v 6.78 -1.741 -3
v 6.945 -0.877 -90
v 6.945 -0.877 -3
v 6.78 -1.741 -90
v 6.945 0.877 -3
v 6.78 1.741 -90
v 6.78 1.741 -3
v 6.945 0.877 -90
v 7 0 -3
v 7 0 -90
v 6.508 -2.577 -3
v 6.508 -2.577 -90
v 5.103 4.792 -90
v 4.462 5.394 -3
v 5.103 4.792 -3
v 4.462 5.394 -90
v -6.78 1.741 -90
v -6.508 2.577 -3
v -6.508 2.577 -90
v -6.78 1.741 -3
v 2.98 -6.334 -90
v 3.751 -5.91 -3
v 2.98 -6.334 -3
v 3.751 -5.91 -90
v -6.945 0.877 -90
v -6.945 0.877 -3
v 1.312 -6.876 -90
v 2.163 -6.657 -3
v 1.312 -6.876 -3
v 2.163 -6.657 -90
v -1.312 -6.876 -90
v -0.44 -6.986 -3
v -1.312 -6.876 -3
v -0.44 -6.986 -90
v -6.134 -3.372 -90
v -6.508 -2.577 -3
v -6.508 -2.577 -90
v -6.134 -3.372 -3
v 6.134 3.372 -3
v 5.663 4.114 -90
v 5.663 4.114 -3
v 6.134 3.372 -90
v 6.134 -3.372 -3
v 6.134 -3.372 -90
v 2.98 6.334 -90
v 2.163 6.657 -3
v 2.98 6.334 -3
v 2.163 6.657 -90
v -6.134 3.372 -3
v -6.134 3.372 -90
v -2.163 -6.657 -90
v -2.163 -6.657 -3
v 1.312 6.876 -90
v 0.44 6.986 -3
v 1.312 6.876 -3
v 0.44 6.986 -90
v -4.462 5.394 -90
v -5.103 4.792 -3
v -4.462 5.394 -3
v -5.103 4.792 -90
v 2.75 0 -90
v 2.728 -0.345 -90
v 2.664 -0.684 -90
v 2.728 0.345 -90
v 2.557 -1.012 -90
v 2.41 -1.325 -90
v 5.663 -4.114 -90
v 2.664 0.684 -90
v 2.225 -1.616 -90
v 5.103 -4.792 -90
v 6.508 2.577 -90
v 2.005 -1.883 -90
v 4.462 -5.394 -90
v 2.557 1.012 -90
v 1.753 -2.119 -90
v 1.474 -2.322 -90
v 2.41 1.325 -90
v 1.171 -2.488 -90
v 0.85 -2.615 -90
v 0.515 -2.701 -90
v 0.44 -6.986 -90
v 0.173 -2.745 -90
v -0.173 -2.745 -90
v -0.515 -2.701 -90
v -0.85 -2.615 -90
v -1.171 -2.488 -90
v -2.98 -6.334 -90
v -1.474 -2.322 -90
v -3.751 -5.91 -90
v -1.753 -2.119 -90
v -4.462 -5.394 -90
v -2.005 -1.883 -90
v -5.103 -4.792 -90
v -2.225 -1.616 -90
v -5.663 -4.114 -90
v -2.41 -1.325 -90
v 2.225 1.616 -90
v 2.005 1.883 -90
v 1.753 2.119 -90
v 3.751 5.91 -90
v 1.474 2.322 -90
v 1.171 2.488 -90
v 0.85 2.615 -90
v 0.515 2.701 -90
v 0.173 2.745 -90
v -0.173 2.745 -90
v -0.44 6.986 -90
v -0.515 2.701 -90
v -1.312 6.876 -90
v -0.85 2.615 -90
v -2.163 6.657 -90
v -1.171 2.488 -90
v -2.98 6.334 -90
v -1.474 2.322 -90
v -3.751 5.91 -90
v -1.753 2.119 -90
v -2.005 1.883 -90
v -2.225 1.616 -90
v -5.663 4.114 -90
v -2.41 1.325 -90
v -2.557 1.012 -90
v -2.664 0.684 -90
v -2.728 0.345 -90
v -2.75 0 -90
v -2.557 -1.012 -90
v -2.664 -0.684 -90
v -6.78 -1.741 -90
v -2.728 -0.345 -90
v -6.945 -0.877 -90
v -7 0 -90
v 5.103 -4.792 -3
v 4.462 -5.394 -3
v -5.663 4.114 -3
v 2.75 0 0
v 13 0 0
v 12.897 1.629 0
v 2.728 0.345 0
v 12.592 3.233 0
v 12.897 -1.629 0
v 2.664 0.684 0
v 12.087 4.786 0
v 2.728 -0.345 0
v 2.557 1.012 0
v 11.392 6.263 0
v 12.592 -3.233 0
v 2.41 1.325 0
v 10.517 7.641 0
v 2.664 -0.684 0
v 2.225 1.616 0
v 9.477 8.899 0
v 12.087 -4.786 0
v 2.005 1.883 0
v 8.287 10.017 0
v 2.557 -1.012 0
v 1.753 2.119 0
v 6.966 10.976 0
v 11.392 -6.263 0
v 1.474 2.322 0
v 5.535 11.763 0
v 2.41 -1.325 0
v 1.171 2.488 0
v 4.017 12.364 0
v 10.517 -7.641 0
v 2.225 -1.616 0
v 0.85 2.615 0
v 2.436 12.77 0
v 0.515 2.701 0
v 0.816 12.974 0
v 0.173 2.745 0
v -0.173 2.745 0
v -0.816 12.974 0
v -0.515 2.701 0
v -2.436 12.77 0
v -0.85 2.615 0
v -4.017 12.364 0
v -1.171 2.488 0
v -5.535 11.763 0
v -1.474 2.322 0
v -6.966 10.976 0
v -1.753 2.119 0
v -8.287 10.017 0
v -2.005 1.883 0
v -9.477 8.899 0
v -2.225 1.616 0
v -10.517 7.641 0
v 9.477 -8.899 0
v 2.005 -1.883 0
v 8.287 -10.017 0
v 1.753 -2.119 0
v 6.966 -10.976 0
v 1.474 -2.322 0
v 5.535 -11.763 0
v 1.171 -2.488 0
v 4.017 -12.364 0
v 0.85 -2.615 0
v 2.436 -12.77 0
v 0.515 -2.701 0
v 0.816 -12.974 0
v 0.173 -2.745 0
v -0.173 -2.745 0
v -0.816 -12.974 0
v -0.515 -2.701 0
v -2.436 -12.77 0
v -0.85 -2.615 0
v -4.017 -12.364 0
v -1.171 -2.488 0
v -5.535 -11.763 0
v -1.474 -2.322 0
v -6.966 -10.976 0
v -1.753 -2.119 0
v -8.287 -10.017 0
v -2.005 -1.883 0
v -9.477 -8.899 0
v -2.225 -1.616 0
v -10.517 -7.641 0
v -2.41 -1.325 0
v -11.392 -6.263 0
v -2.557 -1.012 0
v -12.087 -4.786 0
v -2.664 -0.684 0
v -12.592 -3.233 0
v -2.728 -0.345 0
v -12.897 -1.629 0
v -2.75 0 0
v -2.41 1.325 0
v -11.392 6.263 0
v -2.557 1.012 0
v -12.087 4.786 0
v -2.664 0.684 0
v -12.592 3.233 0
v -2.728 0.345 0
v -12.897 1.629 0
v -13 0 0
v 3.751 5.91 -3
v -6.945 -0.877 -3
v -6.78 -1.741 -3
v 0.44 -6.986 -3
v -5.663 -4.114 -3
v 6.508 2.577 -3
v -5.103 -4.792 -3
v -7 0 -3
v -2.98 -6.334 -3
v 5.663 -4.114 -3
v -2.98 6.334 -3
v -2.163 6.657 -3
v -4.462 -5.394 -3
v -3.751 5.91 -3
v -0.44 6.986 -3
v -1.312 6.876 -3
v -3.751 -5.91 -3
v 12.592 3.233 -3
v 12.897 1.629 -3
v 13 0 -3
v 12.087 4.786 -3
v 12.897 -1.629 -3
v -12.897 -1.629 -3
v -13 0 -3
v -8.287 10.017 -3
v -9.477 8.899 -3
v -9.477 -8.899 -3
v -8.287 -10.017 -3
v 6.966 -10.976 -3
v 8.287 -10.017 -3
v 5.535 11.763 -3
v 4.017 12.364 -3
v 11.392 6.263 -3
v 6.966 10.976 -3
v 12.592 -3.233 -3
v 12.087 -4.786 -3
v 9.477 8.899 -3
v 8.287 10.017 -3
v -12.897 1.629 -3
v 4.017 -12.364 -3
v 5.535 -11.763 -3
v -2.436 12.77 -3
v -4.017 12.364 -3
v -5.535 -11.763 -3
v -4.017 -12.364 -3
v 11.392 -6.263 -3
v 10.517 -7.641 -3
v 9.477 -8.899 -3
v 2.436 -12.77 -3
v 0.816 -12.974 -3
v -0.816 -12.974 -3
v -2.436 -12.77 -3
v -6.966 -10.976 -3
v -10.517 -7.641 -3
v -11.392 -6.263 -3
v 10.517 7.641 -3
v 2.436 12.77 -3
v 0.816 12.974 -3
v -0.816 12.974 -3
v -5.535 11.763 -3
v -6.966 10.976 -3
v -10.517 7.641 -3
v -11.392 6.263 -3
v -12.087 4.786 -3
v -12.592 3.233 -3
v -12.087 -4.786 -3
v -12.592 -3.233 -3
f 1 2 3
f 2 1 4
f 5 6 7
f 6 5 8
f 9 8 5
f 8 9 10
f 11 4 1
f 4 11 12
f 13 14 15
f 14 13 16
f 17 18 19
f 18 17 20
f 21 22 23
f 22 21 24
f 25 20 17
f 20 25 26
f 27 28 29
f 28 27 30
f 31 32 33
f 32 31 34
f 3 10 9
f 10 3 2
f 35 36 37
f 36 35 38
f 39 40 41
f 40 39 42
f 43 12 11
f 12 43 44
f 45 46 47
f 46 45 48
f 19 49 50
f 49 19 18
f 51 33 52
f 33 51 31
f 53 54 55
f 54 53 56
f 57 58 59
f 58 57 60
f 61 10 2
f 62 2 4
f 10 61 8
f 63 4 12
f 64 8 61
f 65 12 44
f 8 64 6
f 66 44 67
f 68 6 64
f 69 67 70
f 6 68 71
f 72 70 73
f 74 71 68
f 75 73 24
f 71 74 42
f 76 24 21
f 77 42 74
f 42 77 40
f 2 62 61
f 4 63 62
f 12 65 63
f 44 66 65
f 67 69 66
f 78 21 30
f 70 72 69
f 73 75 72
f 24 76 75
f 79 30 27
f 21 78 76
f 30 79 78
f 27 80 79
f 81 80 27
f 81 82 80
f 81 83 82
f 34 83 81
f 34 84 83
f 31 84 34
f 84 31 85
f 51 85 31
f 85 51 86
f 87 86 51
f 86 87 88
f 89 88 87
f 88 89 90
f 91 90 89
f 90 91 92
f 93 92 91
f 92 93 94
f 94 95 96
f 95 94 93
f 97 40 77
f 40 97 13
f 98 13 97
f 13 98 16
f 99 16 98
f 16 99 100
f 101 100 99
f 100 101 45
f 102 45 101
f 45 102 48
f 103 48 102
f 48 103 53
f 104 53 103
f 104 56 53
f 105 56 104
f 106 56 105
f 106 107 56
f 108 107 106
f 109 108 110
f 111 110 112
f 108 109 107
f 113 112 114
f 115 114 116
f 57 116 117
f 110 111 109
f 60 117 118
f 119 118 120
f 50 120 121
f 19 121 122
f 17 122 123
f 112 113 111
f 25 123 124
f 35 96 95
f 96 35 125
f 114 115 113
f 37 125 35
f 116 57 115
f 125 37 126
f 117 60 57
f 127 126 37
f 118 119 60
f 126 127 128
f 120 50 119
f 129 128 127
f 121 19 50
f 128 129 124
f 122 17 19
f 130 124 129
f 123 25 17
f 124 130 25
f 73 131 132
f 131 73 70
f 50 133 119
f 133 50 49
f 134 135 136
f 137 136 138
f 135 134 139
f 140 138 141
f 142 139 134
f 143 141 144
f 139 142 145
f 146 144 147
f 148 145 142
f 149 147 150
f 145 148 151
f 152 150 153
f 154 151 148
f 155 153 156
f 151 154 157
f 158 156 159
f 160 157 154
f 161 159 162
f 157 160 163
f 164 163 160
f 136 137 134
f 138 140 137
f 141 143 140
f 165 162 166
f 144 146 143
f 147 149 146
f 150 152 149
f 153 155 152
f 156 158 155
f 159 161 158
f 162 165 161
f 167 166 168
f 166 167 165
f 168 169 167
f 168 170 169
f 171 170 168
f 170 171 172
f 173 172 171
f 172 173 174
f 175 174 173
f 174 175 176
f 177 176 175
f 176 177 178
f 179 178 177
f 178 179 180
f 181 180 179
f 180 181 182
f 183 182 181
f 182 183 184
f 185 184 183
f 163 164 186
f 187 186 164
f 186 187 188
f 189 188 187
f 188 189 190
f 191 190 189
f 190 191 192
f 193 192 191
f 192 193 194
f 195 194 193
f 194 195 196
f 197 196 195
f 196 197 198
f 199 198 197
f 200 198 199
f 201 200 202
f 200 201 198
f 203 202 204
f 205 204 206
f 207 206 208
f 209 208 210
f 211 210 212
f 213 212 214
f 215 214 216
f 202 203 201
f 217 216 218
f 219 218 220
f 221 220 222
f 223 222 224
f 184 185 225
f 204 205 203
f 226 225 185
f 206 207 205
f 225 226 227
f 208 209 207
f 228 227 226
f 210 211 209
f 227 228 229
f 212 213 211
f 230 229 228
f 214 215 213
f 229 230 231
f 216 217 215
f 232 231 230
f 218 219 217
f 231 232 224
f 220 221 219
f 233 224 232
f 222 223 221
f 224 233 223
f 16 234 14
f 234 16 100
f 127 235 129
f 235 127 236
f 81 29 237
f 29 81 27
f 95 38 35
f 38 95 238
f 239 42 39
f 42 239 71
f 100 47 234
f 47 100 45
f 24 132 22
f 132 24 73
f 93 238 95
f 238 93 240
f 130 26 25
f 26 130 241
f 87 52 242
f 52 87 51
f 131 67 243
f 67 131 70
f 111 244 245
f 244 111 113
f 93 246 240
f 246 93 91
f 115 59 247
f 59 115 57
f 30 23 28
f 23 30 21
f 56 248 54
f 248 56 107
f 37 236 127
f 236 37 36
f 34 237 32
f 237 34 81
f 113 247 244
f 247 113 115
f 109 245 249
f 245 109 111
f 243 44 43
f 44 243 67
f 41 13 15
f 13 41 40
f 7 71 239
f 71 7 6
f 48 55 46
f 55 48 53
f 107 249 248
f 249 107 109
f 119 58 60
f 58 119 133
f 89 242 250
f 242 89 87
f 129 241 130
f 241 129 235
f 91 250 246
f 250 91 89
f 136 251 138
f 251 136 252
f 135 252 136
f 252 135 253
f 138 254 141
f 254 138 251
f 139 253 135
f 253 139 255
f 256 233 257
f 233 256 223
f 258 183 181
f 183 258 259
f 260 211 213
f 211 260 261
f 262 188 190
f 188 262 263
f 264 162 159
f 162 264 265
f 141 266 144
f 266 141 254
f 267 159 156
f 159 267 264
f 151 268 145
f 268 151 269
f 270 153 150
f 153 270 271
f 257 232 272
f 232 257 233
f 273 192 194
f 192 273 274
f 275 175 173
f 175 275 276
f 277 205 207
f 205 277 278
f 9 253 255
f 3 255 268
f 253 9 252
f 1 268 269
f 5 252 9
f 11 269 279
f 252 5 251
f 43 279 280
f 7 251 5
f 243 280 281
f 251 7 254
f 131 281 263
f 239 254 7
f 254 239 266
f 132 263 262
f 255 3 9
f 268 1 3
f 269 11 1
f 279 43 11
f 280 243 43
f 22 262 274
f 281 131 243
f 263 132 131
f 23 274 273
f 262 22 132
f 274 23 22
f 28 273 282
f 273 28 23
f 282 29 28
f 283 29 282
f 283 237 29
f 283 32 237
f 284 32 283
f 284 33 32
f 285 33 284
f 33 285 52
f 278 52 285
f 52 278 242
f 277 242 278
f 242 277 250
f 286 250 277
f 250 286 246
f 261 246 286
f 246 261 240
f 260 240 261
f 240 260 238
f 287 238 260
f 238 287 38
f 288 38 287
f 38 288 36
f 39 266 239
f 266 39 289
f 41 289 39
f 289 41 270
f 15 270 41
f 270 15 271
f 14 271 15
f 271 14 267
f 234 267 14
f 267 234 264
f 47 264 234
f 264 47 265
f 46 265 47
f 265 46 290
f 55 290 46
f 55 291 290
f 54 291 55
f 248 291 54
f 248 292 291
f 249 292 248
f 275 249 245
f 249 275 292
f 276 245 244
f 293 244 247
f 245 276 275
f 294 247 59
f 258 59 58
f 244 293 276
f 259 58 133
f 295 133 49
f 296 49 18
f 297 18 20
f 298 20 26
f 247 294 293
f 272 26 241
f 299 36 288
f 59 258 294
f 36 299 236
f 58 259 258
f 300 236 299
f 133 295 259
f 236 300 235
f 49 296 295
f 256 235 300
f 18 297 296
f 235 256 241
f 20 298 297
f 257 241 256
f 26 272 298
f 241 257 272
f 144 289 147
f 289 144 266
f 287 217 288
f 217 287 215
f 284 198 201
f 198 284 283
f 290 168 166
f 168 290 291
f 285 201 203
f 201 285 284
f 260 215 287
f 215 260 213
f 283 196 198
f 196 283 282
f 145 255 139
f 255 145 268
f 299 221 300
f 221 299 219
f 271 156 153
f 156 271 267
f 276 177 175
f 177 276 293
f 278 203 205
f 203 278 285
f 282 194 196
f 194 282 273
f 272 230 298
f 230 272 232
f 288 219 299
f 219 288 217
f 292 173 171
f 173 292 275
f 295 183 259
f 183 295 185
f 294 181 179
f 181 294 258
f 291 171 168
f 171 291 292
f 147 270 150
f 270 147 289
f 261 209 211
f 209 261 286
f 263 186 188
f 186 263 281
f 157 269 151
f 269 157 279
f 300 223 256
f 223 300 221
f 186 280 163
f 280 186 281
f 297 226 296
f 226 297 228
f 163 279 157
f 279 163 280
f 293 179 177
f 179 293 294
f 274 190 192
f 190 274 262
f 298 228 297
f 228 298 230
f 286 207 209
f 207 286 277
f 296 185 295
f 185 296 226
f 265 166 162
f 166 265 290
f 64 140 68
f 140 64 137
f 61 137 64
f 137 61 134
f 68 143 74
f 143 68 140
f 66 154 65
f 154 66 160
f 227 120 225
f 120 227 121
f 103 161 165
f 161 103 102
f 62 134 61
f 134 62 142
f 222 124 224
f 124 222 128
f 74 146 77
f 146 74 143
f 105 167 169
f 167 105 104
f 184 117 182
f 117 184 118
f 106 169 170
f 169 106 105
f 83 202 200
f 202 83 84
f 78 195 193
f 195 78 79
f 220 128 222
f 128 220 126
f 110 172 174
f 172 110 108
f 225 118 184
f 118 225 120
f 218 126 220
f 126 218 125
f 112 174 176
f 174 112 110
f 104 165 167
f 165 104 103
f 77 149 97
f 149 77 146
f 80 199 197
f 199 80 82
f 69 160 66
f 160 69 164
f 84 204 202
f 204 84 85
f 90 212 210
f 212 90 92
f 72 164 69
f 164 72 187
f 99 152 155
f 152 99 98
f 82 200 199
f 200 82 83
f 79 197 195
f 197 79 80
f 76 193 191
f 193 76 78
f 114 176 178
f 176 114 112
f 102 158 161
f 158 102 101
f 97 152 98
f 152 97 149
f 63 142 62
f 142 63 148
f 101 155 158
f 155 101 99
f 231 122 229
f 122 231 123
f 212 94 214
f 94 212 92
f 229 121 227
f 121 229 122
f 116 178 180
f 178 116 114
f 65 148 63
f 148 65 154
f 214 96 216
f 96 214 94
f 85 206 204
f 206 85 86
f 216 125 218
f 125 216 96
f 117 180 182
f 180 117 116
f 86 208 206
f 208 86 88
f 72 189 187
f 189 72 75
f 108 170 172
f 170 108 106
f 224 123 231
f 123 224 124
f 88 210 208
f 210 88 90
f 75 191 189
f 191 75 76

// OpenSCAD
$fn = 50;


difference() {
	union() {
		translate(v = [0, 0, -90.0000000000]) {
			cylinder(h = 90, r = 7.0000000000);
		}
		translate(v = [0, 0, -3.0000000000]) {
			cylinder(h = 3, r = 13.0000000000);
		}
	}
	union() {
		#translate(v = [0, 0, -90]) {
			cylinder(h = 90, r = 2.7500000000);
		}
	}
}
